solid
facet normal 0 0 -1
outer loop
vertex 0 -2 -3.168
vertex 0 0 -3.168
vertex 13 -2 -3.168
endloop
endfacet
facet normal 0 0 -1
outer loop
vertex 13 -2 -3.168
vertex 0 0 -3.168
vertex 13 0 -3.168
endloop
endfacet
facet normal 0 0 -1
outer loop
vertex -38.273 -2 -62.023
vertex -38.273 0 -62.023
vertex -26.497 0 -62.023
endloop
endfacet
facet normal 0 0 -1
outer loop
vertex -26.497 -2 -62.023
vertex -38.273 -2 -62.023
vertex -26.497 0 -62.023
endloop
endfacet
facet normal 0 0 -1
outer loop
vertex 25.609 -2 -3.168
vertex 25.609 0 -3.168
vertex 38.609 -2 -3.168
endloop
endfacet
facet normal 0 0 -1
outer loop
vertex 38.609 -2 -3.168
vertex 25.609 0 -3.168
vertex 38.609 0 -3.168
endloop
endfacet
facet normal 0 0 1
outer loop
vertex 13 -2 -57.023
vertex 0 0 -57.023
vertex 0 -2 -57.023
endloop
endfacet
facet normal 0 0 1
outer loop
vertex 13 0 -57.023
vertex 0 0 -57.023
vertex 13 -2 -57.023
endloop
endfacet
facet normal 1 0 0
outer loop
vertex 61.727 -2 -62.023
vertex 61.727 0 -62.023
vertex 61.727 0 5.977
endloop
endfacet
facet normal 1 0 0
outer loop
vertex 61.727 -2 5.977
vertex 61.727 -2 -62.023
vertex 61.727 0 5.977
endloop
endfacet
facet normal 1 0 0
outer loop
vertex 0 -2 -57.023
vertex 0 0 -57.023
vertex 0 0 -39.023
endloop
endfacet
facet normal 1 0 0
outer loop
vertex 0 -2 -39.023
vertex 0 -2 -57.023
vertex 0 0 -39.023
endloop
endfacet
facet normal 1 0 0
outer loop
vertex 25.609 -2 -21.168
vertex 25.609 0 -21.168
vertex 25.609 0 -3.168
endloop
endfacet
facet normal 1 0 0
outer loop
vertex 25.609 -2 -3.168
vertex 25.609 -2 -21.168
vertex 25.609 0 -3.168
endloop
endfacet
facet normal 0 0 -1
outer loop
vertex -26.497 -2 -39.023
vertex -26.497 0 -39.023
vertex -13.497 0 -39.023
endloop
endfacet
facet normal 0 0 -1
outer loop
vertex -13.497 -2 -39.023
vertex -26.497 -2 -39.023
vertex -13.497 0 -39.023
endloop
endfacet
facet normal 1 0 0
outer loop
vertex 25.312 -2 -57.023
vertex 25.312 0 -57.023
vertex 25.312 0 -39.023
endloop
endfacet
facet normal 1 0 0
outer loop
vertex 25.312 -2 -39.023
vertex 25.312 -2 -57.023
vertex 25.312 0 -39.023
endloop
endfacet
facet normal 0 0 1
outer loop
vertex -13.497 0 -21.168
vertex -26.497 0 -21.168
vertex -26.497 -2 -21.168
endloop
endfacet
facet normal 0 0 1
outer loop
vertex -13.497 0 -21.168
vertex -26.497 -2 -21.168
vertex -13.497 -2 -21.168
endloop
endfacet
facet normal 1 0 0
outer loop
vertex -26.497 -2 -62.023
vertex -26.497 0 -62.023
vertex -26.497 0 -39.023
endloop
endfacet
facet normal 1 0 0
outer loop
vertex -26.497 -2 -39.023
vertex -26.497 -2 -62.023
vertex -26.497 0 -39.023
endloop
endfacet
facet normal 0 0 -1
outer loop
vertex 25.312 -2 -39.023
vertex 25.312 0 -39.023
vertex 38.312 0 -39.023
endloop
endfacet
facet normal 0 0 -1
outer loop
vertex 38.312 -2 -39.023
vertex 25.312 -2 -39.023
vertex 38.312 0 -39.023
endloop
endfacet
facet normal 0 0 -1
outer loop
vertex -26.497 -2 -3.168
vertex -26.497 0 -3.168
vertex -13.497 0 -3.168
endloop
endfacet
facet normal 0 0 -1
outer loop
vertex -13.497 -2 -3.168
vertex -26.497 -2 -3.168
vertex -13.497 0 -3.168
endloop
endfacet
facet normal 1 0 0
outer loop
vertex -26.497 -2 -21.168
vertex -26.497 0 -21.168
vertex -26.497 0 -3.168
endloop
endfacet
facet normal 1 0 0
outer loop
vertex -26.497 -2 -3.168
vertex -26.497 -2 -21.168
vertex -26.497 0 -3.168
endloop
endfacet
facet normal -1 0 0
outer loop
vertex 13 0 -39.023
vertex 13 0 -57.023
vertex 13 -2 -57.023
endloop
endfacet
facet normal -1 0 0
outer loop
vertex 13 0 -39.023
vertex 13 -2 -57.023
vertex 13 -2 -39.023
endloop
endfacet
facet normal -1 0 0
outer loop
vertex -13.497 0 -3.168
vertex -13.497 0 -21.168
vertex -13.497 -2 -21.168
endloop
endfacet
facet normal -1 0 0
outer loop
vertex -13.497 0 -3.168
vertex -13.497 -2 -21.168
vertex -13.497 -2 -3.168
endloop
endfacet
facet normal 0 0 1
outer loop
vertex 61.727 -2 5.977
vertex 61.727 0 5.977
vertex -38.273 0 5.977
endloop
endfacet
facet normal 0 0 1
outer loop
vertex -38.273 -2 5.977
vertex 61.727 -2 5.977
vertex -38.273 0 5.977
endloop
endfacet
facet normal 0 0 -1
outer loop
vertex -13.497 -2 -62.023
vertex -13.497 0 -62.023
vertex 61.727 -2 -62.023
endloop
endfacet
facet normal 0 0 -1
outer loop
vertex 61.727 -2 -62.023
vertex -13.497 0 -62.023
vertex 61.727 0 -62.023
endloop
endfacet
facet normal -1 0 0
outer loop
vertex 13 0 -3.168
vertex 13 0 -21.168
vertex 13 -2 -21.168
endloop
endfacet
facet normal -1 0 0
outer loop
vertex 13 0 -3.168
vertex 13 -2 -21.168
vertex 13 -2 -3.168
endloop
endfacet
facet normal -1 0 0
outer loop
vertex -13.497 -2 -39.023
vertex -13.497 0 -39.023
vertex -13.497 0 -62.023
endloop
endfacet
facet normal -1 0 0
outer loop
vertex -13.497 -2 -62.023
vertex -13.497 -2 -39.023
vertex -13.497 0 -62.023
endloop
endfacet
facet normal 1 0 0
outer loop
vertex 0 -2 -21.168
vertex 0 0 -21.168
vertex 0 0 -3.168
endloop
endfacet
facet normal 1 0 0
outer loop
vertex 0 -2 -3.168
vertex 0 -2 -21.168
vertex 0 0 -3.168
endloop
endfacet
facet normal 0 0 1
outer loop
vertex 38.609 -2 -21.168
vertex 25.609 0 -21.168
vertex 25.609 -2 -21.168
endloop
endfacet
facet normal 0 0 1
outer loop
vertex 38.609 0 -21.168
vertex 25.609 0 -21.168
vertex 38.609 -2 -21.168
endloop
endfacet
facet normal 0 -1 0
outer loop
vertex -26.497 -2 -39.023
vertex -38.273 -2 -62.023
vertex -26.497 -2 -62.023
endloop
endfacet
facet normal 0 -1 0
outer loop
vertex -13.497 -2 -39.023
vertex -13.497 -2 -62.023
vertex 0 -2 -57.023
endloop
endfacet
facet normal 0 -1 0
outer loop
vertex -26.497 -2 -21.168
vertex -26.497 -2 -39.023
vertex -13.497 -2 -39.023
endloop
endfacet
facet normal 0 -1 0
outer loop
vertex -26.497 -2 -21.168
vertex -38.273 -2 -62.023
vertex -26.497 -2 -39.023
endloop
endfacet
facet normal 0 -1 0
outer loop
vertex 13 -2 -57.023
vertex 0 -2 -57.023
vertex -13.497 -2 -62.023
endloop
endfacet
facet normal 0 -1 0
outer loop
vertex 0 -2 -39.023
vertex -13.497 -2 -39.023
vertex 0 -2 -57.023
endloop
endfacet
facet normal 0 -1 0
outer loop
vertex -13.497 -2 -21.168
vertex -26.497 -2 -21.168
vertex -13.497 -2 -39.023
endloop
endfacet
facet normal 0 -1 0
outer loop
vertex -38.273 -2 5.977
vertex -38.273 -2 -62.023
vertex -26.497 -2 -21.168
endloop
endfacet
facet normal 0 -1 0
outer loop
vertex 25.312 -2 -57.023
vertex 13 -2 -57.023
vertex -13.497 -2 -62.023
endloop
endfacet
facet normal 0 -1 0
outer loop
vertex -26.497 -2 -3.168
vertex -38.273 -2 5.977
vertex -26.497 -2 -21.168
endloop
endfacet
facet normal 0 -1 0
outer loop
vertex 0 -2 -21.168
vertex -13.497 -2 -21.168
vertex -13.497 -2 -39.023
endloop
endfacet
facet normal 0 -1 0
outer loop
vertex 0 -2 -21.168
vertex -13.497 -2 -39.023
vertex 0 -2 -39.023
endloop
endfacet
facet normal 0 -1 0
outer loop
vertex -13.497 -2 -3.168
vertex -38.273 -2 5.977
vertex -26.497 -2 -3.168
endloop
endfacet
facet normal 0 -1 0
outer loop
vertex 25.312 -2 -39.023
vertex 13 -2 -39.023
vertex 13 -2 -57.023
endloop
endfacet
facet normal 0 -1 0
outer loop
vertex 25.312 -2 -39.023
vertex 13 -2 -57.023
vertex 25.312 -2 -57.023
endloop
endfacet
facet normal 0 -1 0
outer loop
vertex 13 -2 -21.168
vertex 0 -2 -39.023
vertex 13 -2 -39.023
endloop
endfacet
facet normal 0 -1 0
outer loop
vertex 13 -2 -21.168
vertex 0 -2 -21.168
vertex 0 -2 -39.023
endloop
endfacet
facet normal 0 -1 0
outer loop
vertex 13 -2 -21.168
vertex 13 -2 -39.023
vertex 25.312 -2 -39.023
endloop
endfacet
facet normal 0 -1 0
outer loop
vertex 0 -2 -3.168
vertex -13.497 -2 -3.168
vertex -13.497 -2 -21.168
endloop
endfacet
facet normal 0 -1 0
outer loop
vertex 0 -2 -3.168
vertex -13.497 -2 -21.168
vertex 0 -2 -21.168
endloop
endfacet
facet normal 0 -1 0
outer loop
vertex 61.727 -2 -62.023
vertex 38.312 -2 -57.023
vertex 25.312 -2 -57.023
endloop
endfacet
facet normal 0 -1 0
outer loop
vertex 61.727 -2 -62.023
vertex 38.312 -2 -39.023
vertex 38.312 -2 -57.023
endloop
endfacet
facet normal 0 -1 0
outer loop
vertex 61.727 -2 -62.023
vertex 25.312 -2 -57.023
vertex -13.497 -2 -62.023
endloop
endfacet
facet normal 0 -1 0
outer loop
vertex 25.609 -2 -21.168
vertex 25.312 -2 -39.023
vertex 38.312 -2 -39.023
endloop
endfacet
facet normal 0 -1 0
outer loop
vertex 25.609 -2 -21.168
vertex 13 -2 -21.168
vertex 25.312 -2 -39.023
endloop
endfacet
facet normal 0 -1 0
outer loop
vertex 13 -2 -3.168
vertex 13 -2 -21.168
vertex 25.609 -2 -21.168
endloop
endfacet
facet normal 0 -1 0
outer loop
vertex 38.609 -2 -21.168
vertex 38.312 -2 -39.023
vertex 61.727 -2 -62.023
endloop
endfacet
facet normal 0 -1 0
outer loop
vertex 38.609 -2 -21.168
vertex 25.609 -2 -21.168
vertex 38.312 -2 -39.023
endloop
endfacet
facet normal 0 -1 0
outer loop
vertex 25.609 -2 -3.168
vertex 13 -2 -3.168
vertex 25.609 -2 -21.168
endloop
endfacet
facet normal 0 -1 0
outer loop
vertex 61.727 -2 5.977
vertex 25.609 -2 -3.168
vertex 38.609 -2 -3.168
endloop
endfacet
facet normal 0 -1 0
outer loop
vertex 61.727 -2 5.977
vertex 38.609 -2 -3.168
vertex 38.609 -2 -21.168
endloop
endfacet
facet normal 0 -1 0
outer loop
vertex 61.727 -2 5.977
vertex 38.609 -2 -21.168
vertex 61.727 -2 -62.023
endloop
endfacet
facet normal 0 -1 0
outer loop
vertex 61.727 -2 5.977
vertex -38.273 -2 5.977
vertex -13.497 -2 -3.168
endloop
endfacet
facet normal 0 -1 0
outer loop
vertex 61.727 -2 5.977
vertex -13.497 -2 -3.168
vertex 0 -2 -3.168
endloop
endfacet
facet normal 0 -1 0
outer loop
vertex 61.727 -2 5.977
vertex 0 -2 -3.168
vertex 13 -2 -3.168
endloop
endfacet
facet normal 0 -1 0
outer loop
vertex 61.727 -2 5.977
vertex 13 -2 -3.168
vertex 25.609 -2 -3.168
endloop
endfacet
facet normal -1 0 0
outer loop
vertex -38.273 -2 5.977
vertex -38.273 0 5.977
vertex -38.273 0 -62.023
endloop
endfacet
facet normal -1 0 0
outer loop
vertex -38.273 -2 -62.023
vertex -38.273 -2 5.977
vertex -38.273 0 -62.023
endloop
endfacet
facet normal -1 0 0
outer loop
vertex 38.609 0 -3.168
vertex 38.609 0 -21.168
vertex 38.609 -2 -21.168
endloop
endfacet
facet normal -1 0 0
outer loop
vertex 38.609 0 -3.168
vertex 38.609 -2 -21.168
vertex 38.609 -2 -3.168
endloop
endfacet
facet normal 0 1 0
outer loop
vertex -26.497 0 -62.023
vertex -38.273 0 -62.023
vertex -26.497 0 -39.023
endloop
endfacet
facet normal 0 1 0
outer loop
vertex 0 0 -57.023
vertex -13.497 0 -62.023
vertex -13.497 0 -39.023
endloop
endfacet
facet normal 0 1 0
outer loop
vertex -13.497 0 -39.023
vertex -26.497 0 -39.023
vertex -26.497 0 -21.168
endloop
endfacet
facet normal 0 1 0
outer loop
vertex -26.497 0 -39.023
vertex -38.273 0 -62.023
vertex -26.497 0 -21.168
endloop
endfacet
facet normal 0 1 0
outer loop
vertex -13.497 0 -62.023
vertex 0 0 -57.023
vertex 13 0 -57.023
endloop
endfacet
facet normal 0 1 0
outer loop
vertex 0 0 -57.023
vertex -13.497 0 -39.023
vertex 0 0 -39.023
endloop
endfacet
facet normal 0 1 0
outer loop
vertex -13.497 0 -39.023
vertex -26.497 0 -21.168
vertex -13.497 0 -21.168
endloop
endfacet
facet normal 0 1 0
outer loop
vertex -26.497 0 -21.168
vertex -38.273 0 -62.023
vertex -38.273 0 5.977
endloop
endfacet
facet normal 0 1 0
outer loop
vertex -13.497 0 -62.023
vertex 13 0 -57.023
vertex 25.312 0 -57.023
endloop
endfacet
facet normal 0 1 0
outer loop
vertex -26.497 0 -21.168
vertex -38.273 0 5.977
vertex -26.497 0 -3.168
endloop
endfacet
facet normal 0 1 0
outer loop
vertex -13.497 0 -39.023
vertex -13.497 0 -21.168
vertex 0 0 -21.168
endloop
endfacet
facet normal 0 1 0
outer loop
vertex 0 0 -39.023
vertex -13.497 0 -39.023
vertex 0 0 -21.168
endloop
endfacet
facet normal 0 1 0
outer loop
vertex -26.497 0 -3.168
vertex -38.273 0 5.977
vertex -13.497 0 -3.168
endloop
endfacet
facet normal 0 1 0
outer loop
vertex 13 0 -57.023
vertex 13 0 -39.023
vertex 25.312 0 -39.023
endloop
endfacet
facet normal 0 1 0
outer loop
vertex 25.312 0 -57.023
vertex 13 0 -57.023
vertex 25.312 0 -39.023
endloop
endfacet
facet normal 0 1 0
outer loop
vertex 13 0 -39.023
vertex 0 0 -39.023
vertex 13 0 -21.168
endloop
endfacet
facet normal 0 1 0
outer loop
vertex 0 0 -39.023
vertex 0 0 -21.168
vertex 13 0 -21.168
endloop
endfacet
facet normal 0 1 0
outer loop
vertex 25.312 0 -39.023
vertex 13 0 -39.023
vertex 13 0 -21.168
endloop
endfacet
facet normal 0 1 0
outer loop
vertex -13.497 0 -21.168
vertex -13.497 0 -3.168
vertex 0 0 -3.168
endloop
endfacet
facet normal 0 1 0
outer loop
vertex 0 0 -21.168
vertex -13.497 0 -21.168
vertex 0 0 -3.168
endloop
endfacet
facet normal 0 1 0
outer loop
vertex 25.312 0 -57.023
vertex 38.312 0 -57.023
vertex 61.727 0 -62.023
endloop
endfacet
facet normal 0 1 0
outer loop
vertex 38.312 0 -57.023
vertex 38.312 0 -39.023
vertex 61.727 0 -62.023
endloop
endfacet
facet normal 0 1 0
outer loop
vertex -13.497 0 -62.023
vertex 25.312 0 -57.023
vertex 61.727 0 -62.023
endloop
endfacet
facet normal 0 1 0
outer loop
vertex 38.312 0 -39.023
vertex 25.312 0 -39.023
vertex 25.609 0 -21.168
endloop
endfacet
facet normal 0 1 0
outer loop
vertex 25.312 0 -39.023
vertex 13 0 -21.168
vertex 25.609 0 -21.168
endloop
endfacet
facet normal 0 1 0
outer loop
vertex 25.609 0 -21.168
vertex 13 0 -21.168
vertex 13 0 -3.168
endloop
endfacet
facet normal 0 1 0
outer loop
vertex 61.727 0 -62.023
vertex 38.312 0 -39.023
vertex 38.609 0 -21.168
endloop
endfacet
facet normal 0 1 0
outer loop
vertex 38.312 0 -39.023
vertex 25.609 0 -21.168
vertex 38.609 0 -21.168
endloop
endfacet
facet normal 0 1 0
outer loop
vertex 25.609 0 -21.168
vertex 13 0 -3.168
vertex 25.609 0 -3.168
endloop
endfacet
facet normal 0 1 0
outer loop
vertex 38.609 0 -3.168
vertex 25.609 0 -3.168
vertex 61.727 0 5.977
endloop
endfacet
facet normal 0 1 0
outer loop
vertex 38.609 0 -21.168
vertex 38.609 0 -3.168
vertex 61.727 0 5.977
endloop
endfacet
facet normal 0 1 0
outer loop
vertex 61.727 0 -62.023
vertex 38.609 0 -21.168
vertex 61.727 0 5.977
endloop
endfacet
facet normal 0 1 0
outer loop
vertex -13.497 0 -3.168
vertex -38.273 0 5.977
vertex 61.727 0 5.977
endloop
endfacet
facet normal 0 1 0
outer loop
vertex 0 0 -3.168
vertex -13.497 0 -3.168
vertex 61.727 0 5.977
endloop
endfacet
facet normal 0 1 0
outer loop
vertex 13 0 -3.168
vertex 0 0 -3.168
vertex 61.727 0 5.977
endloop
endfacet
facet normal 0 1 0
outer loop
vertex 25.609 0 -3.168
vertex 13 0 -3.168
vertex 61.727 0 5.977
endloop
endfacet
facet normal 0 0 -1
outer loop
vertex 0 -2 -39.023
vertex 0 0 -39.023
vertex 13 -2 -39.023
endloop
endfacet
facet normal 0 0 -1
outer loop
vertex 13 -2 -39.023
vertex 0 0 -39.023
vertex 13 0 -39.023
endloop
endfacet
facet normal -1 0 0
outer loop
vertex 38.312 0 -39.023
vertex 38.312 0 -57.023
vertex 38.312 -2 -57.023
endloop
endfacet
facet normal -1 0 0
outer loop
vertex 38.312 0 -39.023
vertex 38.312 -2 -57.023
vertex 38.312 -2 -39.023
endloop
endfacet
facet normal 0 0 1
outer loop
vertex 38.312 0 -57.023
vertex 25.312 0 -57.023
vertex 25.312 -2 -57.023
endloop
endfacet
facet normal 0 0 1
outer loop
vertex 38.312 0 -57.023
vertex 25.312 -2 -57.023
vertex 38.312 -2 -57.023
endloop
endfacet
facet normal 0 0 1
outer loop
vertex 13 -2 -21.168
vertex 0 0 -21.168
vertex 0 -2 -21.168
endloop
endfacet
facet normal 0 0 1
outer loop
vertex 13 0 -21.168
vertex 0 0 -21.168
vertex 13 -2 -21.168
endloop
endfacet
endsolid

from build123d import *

# Parameters (mm, degrees)
F0_W     = 13
F0_H     = 18
F1_DEPTH = 2


with BuildPart() as f1:
    # F0 (on Front) → F1 (new body)
    with BuildSketch(Plane.XZ):
        Polygon((61.726972, 5.976971), (-38.273028, 5.976971), (-38.273028, -62.023029), (-26.49671, -62.023029), (-26.49671, -39.023029), (-13.49671, -39.023029), (-13.49671, -62.023029), (61.726972, -62.023029), align=None)
        with Locations((6.5, -48.023029)):
            Rectangle(F0_W, F0_H, mode=Mode.SUBTRACT)
        with Locations((31.812498, -48.023029)):
            Rectangle(F0_W, F0_H, mode=Mode.SUBTRACT)
        with Locations((-19.99671, -12.167763)):
            Rectangle(F0_W, F0_H, mode=Mode.SUBTRACT)
        with Locations((6.5, -12.167763)):
            Rectangle(F0_W, F0_H, mode=Mode.SUBTRACT)
        with Locations((32.108551, -12.167763)):
            Rectangle(F0_W, F0_H, mode=Mode.SUBTRACT)
    extrude(amount=F1_DEPTH)


solid = f1.part
